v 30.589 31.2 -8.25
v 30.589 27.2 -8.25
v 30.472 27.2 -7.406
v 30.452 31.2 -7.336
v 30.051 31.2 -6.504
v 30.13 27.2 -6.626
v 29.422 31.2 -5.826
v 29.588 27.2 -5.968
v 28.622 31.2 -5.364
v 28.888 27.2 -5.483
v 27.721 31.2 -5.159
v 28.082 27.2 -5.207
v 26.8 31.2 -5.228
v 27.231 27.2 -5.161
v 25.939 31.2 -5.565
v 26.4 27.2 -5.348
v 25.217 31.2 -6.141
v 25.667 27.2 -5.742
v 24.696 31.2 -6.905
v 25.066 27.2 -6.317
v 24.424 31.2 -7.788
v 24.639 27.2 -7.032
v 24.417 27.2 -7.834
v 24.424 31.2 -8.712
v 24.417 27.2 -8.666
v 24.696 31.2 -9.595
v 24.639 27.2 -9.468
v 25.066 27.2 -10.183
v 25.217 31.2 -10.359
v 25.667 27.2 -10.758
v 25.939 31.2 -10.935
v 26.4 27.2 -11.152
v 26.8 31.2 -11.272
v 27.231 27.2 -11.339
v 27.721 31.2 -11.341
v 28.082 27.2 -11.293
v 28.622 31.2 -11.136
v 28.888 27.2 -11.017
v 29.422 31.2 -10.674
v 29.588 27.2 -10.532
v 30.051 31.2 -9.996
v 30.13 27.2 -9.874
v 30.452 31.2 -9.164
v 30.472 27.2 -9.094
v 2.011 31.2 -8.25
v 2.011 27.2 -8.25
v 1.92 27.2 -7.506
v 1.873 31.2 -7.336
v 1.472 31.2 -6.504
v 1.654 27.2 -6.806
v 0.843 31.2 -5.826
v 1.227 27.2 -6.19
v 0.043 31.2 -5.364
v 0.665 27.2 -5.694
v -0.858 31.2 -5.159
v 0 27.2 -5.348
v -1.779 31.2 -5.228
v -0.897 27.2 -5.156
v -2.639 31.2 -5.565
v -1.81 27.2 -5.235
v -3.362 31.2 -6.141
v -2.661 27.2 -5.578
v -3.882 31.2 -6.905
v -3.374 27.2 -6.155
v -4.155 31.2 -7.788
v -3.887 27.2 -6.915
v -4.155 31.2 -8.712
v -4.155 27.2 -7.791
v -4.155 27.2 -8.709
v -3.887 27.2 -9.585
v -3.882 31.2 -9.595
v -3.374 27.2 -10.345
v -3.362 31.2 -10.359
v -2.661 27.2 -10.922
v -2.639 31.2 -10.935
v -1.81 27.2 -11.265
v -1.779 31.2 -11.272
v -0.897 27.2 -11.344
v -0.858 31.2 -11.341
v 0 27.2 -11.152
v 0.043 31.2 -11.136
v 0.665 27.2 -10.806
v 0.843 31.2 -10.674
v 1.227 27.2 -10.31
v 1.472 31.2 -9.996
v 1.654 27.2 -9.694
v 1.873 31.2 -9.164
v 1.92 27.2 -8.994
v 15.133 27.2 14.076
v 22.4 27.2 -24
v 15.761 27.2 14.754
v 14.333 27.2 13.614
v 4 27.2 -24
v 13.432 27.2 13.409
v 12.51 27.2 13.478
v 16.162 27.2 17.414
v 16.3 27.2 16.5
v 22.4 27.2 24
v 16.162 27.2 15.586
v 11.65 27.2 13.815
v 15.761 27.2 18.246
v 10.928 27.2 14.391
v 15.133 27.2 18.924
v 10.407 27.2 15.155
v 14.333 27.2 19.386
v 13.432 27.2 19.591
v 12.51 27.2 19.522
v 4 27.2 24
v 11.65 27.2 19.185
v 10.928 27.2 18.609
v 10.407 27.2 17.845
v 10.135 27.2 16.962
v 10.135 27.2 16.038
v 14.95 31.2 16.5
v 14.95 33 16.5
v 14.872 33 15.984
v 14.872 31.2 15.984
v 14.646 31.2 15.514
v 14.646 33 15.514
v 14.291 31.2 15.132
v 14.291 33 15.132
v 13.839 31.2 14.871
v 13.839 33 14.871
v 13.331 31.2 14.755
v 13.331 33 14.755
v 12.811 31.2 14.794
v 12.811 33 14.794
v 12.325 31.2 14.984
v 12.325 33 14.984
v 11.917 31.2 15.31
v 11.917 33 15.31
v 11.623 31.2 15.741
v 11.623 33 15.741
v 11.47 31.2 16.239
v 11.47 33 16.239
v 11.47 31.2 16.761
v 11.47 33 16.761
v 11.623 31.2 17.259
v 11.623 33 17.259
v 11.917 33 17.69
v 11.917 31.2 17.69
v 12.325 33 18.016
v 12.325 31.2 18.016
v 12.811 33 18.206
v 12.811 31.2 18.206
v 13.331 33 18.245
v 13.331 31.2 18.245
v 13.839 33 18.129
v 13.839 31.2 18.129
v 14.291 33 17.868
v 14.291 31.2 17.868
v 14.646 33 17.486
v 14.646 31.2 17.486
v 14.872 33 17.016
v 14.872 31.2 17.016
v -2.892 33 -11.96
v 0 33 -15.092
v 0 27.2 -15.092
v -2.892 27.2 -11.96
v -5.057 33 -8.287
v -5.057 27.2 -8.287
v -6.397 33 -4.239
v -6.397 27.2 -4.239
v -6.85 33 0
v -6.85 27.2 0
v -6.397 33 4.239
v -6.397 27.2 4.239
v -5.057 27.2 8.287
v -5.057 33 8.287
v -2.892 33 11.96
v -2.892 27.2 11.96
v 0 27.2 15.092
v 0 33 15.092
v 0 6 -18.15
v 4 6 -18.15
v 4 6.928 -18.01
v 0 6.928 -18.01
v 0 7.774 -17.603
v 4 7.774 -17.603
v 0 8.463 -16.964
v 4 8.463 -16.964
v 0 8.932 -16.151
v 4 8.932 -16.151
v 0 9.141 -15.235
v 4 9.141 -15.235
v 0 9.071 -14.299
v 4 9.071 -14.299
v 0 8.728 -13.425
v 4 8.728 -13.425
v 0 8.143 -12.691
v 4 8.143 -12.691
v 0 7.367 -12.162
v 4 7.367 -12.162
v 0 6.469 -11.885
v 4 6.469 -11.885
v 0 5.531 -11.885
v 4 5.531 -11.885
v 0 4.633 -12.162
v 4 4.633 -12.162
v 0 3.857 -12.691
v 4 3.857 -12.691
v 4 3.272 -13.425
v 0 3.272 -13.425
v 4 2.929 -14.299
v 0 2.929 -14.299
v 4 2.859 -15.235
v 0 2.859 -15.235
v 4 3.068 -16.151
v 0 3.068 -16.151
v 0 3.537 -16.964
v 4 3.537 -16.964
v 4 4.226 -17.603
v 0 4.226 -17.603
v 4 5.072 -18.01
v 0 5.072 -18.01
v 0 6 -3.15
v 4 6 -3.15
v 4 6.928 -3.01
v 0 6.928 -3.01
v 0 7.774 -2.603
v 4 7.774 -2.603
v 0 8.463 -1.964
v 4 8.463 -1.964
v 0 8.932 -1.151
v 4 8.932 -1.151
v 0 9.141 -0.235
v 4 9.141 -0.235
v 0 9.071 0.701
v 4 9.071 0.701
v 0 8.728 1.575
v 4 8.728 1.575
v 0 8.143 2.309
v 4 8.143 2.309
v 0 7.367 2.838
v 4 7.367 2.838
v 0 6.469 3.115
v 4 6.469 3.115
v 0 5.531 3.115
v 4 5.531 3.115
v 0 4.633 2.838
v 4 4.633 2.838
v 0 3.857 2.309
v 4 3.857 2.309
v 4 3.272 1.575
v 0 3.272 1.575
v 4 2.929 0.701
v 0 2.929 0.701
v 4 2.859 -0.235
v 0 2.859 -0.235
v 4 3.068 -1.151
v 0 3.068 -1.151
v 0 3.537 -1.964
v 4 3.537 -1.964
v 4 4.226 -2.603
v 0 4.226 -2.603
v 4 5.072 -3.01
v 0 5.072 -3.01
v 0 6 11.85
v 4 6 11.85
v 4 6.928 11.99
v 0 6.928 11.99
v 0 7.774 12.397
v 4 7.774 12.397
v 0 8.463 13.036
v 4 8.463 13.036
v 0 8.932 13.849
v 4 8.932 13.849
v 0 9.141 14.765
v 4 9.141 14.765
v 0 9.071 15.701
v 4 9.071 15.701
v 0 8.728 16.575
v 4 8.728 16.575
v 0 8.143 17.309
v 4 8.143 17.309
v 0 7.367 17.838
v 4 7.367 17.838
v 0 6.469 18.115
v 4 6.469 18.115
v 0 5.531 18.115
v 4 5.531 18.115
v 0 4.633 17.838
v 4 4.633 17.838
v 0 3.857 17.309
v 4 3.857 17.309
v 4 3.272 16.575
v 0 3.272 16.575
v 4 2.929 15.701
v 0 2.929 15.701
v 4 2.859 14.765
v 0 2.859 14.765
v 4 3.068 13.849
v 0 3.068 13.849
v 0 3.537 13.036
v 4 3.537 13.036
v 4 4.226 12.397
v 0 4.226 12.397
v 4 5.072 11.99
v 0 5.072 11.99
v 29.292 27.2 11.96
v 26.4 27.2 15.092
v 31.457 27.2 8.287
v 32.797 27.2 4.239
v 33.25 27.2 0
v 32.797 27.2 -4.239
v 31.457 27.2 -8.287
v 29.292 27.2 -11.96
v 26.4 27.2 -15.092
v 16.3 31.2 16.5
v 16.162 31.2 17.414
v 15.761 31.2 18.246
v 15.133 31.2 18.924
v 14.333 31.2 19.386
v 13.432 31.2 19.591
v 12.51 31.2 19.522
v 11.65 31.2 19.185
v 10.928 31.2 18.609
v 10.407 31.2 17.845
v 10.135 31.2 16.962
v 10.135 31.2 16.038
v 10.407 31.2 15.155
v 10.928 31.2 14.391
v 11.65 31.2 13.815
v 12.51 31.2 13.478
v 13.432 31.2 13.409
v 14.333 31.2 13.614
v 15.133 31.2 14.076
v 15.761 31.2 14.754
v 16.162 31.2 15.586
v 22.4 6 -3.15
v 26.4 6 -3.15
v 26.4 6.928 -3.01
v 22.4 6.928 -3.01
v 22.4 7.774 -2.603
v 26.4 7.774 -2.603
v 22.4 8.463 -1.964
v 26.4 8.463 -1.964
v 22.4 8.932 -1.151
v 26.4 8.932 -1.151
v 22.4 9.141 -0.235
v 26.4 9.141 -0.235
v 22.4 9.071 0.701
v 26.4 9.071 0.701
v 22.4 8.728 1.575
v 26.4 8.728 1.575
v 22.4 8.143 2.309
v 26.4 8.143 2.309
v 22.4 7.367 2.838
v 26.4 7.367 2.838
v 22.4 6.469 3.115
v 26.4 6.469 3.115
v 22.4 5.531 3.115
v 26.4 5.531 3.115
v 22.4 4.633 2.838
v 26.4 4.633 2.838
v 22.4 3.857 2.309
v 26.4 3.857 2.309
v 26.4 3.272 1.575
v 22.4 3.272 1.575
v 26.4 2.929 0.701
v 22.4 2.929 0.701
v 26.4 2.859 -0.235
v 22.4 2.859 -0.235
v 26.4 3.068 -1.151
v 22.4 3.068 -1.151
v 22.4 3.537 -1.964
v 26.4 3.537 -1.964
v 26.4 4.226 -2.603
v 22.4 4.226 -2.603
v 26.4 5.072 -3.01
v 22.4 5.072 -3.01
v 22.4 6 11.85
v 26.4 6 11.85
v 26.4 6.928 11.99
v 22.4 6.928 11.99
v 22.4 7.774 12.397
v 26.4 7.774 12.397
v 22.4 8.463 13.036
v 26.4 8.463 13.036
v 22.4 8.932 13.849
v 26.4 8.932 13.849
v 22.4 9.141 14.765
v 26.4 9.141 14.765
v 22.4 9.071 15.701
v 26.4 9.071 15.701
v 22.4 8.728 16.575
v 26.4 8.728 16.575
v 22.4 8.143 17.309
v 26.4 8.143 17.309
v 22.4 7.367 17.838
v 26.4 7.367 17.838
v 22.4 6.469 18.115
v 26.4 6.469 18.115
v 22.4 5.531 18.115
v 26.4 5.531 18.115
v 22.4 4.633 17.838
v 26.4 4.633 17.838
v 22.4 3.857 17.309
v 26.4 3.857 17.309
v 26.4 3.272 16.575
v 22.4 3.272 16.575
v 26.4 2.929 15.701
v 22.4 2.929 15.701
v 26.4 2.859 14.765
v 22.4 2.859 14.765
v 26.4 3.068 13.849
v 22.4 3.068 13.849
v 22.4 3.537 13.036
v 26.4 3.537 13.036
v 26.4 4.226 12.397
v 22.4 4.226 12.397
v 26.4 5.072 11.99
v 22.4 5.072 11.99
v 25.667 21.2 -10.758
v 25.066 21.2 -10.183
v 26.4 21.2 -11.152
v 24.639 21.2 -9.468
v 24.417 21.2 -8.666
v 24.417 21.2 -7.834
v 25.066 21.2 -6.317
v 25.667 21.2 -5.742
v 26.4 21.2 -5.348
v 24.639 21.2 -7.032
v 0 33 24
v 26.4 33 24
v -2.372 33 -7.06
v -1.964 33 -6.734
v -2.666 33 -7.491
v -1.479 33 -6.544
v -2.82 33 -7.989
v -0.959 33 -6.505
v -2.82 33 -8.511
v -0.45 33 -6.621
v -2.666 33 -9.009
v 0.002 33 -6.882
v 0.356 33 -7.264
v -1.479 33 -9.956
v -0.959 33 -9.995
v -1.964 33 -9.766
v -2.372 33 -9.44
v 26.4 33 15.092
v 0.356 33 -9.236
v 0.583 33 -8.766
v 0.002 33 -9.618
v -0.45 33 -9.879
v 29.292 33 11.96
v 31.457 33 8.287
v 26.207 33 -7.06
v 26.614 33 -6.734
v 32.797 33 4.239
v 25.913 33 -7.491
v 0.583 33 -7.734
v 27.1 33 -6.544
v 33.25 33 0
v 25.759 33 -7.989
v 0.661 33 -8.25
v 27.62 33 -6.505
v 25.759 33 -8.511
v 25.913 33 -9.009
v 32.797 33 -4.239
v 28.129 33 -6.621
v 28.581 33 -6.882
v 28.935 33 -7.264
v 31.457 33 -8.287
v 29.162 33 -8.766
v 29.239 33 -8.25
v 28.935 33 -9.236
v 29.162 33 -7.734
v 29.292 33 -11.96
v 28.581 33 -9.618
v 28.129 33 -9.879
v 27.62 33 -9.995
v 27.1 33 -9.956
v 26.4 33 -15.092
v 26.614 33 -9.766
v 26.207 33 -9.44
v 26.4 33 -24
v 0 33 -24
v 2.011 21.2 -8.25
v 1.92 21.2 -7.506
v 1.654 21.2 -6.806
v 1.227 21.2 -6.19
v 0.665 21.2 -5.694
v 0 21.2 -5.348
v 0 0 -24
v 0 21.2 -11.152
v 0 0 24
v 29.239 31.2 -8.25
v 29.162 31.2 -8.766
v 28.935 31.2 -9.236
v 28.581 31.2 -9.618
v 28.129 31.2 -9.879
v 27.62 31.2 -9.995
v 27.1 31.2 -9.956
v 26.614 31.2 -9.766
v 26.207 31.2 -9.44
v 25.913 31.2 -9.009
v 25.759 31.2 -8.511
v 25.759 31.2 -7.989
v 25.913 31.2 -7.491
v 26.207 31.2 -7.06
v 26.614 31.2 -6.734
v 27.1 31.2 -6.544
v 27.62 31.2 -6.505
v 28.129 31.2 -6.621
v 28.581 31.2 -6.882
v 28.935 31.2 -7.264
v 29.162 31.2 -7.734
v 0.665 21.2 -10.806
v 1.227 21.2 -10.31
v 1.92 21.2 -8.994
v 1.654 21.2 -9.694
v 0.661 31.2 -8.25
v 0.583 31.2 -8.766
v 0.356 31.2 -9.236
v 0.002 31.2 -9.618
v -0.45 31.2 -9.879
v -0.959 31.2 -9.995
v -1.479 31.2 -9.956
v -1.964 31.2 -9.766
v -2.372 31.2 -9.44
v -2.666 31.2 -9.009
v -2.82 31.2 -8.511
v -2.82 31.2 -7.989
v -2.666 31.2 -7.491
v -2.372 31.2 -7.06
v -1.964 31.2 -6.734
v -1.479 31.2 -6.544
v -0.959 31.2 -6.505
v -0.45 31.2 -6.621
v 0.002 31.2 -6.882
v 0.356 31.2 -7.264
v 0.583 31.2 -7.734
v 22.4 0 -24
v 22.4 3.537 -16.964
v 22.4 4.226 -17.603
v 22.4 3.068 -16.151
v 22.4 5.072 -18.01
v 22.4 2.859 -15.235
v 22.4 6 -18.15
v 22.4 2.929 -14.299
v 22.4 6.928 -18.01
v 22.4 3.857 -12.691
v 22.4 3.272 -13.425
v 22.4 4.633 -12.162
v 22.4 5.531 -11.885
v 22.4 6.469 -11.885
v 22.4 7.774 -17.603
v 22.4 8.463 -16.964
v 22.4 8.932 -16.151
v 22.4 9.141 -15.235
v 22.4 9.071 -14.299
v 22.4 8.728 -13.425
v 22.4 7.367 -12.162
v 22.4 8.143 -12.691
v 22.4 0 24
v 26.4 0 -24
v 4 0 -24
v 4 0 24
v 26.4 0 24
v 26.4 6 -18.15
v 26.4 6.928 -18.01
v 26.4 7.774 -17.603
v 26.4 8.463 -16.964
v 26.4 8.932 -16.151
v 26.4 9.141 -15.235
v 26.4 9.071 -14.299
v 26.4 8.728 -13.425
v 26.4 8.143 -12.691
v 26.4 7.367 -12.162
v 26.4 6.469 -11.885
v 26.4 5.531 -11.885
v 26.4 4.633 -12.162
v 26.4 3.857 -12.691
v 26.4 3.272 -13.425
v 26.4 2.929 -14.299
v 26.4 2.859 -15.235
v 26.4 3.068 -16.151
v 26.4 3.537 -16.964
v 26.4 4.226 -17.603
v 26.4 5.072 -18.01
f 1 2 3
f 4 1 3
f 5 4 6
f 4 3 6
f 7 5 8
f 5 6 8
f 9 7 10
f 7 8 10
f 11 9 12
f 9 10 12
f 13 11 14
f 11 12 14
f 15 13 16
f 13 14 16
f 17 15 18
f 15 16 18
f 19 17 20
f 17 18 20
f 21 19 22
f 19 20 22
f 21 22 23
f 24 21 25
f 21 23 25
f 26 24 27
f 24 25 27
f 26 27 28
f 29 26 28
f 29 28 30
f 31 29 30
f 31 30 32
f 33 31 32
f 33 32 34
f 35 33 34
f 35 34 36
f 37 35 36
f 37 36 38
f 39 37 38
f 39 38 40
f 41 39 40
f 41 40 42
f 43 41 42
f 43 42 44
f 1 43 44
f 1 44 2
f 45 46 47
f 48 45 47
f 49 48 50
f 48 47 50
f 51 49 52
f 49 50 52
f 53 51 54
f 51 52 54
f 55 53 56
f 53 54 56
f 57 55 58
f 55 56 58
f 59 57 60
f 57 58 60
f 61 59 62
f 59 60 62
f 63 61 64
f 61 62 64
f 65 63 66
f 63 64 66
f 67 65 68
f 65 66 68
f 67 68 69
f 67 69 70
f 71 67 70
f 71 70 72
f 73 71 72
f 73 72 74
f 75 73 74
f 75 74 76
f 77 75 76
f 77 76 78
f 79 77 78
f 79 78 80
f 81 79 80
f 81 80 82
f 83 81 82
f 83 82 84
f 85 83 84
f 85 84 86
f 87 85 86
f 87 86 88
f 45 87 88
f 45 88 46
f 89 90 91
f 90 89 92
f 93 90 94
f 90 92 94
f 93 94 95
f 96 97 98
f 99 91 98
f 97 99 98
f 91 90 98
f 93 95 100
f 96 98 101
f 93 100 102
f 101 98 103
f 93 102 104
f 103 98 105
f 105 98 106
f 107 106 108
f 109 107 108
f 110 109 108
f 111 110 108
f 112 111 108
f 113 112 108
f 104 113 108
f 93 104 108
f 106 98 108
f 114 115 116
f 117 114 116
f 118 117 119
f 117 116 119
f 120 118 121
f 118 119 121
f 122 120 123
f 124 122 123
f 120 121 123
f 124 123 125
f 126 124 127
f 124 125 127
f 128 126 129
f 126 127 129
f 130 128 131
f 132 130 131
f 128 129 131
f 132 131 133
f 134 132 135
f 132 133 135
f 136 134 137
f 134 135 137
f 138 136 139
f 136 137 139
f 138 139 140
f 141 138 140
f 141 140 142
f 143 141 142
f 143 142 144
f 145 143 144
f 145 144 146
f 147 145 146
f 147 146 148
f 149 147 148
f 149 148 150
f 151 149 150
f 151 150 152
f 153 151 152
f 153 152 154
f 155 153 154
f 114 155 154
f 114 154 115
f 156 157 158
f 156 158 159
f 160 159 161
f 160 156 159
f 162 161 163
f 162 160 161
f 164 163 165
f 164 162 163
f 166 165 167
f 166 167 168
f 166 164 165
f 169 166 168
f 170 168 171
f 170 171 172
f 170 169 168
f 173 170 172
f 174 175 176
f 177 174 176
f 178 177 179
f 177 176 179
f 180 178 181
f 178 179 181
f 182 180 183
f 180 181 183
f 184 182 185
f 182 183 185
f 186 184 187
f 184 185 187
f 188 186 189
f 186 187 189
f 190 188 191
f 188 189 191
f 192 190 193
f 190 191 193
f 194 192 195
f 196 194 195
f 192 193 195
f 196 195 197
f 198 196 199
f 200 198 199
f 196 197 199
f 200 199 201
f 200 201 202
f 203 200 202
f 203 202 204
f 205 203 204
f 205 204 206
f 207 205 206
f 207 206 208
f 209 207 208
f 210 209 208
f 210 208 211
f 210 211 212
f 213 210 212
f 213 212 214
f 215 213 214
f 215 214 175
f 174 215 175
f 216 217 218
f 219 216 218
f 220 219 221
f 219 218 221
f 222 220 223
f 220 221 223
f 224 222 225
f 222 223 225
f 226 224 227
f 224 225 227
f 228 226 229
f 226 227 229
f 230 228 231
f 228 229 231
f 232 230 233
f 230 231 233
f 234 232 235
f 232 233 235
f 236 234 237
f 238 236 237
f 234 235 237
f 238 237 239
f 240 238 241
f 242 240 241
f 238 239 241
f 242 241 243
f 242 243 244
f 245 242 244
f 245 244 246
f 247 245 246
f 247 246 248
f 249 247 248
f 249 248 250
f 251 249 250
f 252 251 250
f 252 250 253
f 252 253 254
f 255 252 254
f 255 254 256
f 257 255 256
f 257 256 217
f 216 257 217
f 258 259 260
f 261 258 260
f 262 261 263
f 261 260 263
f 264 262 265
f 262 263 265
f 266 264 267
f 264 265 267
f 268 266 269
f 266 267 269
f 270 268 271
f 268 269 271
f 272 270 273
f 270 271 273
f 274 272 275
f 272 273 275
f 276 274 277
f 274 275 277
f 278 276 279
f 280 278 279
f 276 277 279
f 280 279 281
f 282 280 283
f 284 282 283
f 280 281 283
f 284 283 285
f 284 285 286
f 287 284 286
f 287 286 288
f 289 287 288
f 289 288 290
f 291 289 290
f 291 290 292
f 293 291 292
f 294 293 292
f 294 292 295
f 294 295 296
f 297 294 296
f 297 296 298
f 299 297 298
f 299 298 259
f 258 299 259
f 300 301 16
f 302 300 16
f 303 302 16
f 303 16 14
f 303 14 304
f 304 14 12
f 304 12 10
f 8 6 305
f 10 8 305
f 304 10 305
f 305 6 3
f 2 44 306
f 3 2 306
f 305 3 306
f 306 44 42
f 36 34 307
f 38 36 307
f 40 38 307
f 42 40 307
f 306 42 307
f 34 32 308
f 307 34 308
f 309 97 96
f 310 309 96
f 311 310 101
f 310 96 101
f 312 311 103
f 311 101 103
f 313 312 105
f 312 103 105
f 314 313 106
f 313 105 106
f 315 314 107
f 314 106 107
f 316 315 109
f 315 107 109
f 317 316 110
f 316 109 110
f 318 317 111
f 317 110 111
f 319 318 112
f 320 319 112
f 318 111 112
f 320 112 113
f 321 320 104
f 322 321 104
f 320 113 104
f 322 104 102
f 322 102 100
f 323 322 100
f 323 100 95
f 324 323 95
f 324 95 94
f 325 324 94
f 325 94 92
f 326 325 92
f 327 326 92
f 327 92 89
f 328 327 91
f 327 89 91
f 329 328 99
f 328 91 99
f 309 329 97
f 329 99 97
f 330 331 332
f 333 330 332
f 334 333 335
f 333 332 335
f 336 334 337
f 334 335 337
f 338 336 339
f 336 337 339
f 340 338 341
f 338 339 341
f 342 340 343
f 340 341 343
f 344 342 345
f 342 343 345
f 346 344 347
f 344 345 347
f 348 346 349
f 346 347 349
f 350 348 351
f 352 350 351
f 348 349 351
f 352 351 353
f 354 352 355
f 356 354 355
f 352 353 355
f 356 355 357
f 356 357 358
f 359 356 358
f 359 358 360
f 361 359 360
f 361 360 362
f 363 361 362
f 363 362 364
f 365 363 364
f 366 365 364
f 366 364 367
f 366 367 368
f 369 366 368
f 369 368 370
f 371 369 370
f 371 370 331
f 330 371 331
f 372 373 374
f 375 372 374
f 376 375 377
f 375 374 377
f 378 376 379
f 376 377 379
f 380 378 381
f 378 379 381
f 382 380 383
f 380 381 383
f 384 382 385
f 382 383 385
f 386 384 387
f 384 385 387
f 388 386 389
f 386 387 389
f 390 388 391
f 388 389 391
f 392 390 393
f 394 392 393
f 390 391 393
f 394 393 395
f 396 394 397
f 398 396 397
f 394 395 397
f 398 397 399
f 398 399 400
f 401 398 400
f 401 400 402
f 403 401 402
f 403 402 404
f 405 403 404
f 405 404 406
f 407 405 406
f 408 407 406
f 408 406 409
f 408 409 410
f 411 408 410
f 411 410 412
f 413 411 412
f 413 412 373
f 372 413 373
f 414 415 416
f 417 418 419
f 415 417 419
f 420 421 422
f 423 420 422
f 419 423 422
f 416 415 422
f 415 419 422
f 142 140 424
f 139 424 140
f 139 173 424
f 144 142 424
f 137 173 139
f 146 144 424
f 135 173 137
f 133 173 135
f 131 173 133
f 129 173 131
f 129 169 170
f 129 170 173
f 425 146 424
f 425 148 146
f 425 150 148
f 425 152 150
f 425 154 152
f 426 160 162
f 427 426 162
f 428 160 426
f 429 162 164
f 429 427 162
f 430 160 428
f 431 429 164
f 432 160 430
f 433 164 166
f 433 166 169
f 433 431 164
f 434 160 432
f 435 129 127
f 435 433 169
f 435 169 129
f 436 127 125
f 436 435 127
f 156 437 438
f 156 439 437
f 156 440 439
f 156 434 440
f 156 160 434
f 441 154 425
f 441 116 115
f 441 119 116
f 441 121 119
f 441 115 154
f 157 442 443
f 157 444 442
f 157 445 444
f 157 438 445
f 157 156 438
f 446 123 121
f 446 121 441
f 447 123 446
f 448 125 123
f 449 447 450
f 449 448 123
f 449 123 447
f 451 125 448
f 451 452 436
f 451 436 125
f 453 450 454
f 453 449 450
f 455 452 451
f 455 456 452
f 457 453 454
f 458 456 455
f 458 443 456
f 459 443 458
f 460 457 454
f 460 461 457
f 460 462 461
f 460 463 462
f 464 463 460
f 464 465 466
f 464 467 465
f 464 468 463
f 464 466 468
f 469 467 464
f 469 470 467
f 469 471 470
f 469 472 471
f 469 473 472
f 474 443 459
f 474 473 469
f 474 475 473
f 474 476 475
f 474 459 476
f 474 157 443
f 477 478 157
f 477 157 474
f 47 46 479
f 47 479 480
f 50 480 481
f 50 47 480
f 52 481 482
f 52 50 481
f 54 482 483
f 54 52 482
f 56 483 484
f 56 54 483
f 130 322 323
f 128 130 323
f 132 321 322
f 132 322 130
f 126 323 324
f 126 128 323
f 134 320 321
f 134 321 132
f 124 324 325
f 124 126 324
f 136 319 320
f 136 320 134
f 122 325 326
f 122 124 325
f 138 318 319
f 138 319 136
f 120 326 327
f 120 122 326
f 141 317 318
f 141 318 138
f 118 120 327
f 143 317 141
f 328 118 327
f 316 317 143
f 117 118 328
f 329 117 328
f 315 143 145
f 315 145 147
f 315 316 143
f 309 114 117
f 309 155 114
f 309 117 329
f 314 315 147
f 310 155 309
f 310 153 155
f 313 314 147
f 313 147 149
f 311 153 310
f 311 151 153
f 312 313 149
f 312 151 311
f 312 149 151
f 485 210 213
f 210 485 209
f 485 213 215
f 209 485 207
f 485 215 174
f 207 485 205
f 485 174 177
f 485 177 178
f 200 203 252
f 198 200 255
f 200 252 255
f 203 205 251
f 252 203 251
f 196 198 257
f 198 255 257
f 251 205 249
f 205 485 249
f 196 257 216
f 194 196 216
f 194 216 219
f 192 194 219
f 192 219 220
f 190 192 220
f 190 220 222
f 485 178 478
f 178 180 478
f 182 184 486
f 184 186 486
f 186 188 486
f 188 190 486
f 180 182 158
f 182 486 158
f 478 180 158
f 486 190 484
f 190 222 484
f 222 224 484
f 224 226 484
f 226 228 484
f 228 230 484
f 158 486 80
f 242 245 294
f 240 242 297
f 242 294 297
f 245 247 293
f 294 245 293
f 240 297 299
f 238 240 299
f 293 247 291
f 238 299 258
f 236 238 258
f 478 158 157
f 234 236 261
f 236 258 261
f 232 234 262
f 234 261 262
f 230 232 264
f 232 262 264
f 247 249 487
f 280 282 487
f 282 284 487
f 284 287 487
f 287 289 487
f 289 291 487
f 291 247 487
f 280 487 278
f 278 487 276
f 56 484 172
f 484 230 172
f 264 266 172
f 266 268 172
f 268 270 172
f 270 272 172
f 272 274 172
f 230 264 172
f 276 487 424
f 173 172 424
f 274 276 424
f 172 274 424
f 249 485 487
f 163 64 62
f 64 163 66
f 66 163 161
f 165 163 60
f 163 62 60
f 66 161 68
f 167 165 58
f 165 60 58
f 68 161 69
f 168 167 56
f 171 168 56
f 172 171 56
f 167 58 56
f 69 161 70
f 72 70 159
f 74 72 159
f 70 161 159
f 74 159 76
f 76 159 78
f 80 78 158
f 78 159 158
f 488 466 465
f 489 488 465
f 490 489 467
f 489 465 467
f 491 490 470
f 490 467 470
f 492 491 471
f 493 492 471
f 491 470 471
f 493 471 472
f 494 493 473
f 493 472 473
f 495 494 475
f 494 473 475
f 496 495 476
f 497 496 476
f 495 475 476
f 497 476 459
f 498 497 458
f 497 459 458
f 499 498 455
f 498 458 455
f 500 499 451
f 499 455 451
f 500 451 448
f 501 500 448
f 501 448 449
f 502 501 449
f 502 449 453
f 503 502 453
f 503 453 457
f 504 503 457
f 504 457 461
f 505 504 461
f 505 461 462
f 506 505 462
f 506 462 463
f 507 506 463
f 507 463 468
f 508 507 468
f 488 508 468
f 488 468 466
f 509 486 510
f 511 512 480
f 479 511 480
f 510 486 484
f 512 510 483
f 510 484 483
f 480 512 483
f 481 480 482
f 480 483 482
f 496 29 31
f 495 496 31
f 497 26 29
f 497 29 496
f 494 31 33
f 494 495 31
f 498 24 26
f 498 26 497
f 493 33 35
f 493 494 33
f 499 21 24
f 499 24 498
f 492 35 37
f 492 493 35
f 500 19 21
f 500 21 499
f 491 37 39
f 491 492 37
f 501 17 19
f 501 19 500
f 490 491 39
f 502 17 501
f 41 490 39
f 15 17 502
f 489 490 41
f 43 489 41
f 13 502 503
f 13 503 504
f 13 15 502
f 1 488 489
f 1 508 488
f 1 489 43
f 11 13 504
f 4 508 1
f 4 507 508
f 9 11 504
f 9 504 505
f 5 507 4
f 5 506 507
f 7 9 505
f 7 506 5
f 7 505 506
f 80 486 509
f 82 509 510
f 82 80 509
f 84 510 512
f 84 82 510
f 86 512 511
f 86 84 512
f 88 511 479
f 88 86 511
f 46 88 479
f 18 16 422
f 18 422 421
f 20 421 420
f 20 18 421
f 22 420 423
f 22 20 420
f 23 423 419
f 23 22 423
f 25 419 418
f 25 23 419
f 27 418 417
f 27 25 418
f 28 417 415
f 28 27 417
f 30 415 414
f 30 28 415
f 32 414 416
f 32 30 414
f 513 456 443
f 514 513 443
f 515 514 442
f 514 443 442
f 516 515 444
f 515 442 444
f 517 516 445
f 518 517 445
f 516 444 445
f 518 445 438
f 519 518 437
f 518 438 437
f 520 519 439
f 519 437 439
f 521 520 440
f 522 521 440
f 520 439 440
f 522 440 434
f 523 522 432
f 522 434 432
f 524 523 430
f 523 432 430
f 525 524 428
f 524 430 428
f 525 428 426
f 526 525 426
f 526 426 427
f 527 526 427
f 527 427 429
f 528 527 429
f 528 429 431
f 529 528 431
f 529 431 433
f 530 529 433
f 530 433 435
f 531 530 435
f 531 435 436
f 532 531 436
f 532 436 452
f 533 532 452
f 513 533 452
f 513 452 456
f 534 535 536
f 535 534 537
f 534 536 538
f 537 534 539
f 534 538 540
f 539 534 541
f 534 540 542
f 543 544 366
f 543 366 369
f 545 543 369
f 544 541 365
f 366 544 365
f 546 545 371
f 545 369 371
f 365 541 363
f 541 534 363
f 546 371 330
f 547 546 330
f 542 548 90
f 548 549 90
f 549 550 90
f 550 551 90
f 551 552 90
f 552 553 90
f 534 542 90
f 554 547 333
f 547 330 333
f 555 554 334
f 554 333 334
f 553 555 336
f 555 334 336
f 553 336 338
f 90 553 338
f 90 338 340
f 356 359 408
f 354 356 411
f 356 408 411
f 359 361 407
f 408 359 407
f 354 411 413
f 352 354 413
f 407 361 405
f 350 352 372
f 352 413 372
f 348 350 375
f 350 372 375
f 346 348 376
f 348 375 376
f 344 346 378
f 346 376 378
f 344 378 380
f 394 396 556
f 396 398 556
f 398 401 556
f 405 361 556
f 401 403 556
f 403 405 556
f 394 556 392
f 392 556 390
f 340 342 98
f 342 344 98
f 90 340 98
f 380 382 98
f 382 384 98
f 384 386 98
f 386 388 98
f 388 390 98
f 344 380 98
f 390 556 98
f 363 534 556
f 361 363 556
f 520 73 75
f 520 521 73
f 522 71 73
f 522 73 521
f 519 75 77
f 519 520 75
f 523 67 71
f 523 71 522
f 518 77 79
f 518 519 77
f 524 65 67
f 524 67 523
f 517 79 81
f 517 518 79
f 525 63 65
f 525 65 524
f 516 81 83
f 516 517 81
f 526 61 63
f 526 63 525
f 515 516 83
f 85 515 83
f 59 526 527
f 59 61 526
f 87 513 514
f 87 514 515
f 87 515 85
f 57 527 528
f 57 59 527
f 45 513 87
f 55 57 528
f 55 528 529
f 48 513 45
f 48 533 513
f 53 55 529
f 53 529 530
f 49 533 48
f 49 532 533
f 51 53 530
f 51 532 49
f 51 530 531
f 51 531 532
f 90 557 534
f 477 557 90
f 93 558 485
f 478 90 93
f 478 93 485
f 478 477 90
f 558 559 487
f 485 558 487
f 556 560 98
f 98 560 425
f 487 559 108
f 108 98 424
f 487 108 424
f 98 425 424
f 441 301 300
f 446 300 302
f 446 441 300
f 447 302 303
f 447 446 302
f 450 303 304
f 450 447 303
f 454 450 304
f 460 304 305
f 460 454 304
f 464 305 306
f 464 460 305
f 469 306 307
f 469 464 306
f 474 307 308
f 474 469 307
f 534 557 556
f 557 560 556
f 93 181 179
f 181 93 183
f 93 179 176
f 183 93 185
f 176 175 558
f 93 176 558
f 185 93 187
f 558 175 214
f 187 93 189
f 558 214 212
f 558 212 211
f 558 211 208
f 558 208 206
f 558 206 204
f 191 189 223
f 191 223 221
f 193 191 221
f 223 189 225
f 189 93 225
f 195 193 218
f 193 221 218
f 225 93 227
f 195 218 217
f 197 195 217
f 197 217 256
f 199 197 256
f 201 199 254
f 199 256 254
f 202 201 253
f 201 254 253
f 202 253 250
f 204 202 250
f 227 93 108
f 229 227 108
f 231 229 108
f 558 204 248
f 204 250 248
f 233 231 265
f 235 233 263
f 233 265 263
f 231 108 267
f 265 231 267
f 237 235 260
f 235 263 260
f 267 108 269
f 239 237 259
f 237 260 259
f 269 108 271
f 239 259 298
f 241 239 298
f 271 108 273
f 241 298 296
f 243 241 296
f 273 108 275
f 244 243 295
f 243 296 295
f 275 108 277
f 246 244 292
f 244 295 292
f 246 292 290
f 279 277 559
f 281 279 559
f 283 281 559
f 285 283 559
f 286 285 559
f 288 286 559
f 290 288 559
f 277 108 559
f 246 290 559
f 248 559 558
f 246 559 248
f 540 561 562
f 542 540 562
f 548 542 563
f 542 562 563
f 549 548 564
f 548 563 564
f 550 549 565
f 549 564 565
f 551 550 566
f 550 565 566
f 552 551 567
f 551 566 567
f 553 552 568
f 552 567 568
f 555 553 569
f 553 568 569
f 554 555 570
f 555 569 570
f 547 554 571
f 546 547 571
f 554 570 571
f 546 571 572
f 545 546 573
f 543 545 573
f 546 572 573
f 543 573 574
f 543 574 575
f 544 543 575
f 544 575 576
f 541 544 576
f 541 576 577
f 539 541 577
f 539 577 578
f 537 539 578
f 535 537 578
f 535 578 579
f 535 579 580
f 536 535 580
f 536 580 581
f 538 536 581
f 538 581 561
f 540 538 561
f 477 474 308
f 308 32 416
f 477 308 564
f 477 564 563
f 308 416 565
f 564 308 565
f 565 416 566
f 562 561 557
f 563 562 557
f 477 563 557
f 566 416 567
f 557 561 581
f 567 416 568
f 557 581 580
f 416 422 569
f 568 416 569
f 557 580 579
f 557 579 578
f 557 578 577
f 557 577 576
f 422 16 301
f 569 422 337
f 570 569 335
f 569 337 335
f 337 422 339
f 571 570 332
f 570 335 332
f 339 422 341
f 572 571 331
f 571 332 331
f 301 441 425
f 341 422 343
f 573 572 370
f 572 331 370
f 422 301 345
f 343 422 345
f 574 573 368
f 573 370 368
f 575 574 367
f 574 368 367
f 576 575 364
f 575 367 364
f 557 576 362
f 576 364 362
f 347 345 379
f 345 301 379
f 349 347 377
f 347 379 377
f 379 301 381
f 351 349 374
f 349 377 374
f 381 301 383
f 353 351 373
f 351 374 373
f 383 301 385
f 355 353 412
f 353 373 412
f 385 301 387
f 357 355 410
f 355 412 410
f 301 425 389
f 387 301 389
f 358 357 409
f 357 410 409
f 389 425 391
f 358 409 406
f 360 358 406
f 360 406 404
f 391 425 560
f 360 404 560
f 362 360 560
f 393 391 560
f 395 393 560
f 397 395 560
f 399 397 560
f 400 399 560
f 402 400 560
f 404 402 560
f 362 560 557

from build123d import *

# Parameters (mm, degrees)
EXTRUDE_1_DEPTH     = 24
SKETCH_3_R          = 3.15
CUT_EXTRUDE_2_DEPTH = 26.4
SKETCH_4_R          = 20.05
EXTRUDE_2_DEPTH     = 5.8
SKETCH_5_R          = 1.75
CUT_EXTRUDE_3_DEPTH = 5.8
SKETCH_6_R          = 3.1
CUT_EXTRUDE_4_DEPTH = 4
SKETCH_6_3_R        = 3.1
CUT_EXTRUDE_5_DEPTH = 6


with BuildPart() as part:
    # 草圖1 → 填料-伸長1 (new body, symmetric)
    with BuildSketch(Plane.XY):
        Polygon((0, 0), (0, 33), (26.4, 33), (26.4, 0), (22.4, 0), (22.4, 27.2), (4, 27.2), (4, 0), align=None)
    extrude(amount=EXTRUDE_1_DEPTH, both=True)

    # 草圖3 → 除料-伸長2 (cut)
    with BuildSketch(Plane(origin=(26.4, 0, 0), x_dir=(0, 0, -1), z_dir=(1, 0, 0))):
        with Locations((0, 6)):
            Circle(SKETCH_3_R)
        with Locations((15, 6)):
            Circle(SKETCH_3_R)
        with Locations((-15, 6)):
            Circle(SKETCH_3_R)
    extrude(amount=-CUT_EXTRUDE_2_DEPTH, mode=Mode.SUBTRACT)

    # 草圖4 → 填料-伸長2 (add)
    with BuildSketch(Plane(origin=(0, 33, 0), x_dir=(1, 0, 0), z_dir=(0, 1, 0))):
        with Locations((13.2, 0)):
            Circle(SKETCH_4_R)
    extrude(amount=-EXTRUDE_2_DEPTH)

    # 草圖5 → 除料-伸長3 (cut)
    with BuildSketch(Plane(origin=(0, 33, 0), x_dir=(1, 0, 0), z_dir=(0, 1, 0))):
        with Locations((13.2, -16.5)):
            Circle(SKETCH_5_R)
        with Locations((-1.089419162, 8.25)):
            Circle(SKETCH_5_R)
        with Locations((27.489419162, 8.25)):
            Circle(SKETCH_5_R)
    extrude(amount=-CUT_EXTRUDE_3_DEPTH, mode=Mode.SUBTRACT)

    # 草圖6 → 除料-伸長4 (cut)
    with BuildSketch(Plane.XZ.offset(-27.2)):
        with Locations((-1.089419162, -8.25)):
            Circle(SKETCH_6_R)
        with Locations((13.2, 16.5)):
            Circle(SKETCH_6_R)
        with Locations((27.489419162, -8.25)):
            Circle(SKETCH_6_R)
    extrude(amount=-CUT_EXTRUDE_4_DEPTH, mode=Mode.SUBTRACT)

    # 草圖6<3> → 除料-伸長5 (cut)
    with BuildSketch(Plane.XZ.offset(-27.2)):
        with Locations((-1.089419162, -8.25)):
            Circle(SKETCH_6_3_R)
        with Locations((27.489419162, -8.25)):
            Circle(SKETCH_6_3_R)
    extrude(amount=CUT_EXTRUDE_5_DEPTH, mode=Mode.SUBTRACT)


solid = part.part
